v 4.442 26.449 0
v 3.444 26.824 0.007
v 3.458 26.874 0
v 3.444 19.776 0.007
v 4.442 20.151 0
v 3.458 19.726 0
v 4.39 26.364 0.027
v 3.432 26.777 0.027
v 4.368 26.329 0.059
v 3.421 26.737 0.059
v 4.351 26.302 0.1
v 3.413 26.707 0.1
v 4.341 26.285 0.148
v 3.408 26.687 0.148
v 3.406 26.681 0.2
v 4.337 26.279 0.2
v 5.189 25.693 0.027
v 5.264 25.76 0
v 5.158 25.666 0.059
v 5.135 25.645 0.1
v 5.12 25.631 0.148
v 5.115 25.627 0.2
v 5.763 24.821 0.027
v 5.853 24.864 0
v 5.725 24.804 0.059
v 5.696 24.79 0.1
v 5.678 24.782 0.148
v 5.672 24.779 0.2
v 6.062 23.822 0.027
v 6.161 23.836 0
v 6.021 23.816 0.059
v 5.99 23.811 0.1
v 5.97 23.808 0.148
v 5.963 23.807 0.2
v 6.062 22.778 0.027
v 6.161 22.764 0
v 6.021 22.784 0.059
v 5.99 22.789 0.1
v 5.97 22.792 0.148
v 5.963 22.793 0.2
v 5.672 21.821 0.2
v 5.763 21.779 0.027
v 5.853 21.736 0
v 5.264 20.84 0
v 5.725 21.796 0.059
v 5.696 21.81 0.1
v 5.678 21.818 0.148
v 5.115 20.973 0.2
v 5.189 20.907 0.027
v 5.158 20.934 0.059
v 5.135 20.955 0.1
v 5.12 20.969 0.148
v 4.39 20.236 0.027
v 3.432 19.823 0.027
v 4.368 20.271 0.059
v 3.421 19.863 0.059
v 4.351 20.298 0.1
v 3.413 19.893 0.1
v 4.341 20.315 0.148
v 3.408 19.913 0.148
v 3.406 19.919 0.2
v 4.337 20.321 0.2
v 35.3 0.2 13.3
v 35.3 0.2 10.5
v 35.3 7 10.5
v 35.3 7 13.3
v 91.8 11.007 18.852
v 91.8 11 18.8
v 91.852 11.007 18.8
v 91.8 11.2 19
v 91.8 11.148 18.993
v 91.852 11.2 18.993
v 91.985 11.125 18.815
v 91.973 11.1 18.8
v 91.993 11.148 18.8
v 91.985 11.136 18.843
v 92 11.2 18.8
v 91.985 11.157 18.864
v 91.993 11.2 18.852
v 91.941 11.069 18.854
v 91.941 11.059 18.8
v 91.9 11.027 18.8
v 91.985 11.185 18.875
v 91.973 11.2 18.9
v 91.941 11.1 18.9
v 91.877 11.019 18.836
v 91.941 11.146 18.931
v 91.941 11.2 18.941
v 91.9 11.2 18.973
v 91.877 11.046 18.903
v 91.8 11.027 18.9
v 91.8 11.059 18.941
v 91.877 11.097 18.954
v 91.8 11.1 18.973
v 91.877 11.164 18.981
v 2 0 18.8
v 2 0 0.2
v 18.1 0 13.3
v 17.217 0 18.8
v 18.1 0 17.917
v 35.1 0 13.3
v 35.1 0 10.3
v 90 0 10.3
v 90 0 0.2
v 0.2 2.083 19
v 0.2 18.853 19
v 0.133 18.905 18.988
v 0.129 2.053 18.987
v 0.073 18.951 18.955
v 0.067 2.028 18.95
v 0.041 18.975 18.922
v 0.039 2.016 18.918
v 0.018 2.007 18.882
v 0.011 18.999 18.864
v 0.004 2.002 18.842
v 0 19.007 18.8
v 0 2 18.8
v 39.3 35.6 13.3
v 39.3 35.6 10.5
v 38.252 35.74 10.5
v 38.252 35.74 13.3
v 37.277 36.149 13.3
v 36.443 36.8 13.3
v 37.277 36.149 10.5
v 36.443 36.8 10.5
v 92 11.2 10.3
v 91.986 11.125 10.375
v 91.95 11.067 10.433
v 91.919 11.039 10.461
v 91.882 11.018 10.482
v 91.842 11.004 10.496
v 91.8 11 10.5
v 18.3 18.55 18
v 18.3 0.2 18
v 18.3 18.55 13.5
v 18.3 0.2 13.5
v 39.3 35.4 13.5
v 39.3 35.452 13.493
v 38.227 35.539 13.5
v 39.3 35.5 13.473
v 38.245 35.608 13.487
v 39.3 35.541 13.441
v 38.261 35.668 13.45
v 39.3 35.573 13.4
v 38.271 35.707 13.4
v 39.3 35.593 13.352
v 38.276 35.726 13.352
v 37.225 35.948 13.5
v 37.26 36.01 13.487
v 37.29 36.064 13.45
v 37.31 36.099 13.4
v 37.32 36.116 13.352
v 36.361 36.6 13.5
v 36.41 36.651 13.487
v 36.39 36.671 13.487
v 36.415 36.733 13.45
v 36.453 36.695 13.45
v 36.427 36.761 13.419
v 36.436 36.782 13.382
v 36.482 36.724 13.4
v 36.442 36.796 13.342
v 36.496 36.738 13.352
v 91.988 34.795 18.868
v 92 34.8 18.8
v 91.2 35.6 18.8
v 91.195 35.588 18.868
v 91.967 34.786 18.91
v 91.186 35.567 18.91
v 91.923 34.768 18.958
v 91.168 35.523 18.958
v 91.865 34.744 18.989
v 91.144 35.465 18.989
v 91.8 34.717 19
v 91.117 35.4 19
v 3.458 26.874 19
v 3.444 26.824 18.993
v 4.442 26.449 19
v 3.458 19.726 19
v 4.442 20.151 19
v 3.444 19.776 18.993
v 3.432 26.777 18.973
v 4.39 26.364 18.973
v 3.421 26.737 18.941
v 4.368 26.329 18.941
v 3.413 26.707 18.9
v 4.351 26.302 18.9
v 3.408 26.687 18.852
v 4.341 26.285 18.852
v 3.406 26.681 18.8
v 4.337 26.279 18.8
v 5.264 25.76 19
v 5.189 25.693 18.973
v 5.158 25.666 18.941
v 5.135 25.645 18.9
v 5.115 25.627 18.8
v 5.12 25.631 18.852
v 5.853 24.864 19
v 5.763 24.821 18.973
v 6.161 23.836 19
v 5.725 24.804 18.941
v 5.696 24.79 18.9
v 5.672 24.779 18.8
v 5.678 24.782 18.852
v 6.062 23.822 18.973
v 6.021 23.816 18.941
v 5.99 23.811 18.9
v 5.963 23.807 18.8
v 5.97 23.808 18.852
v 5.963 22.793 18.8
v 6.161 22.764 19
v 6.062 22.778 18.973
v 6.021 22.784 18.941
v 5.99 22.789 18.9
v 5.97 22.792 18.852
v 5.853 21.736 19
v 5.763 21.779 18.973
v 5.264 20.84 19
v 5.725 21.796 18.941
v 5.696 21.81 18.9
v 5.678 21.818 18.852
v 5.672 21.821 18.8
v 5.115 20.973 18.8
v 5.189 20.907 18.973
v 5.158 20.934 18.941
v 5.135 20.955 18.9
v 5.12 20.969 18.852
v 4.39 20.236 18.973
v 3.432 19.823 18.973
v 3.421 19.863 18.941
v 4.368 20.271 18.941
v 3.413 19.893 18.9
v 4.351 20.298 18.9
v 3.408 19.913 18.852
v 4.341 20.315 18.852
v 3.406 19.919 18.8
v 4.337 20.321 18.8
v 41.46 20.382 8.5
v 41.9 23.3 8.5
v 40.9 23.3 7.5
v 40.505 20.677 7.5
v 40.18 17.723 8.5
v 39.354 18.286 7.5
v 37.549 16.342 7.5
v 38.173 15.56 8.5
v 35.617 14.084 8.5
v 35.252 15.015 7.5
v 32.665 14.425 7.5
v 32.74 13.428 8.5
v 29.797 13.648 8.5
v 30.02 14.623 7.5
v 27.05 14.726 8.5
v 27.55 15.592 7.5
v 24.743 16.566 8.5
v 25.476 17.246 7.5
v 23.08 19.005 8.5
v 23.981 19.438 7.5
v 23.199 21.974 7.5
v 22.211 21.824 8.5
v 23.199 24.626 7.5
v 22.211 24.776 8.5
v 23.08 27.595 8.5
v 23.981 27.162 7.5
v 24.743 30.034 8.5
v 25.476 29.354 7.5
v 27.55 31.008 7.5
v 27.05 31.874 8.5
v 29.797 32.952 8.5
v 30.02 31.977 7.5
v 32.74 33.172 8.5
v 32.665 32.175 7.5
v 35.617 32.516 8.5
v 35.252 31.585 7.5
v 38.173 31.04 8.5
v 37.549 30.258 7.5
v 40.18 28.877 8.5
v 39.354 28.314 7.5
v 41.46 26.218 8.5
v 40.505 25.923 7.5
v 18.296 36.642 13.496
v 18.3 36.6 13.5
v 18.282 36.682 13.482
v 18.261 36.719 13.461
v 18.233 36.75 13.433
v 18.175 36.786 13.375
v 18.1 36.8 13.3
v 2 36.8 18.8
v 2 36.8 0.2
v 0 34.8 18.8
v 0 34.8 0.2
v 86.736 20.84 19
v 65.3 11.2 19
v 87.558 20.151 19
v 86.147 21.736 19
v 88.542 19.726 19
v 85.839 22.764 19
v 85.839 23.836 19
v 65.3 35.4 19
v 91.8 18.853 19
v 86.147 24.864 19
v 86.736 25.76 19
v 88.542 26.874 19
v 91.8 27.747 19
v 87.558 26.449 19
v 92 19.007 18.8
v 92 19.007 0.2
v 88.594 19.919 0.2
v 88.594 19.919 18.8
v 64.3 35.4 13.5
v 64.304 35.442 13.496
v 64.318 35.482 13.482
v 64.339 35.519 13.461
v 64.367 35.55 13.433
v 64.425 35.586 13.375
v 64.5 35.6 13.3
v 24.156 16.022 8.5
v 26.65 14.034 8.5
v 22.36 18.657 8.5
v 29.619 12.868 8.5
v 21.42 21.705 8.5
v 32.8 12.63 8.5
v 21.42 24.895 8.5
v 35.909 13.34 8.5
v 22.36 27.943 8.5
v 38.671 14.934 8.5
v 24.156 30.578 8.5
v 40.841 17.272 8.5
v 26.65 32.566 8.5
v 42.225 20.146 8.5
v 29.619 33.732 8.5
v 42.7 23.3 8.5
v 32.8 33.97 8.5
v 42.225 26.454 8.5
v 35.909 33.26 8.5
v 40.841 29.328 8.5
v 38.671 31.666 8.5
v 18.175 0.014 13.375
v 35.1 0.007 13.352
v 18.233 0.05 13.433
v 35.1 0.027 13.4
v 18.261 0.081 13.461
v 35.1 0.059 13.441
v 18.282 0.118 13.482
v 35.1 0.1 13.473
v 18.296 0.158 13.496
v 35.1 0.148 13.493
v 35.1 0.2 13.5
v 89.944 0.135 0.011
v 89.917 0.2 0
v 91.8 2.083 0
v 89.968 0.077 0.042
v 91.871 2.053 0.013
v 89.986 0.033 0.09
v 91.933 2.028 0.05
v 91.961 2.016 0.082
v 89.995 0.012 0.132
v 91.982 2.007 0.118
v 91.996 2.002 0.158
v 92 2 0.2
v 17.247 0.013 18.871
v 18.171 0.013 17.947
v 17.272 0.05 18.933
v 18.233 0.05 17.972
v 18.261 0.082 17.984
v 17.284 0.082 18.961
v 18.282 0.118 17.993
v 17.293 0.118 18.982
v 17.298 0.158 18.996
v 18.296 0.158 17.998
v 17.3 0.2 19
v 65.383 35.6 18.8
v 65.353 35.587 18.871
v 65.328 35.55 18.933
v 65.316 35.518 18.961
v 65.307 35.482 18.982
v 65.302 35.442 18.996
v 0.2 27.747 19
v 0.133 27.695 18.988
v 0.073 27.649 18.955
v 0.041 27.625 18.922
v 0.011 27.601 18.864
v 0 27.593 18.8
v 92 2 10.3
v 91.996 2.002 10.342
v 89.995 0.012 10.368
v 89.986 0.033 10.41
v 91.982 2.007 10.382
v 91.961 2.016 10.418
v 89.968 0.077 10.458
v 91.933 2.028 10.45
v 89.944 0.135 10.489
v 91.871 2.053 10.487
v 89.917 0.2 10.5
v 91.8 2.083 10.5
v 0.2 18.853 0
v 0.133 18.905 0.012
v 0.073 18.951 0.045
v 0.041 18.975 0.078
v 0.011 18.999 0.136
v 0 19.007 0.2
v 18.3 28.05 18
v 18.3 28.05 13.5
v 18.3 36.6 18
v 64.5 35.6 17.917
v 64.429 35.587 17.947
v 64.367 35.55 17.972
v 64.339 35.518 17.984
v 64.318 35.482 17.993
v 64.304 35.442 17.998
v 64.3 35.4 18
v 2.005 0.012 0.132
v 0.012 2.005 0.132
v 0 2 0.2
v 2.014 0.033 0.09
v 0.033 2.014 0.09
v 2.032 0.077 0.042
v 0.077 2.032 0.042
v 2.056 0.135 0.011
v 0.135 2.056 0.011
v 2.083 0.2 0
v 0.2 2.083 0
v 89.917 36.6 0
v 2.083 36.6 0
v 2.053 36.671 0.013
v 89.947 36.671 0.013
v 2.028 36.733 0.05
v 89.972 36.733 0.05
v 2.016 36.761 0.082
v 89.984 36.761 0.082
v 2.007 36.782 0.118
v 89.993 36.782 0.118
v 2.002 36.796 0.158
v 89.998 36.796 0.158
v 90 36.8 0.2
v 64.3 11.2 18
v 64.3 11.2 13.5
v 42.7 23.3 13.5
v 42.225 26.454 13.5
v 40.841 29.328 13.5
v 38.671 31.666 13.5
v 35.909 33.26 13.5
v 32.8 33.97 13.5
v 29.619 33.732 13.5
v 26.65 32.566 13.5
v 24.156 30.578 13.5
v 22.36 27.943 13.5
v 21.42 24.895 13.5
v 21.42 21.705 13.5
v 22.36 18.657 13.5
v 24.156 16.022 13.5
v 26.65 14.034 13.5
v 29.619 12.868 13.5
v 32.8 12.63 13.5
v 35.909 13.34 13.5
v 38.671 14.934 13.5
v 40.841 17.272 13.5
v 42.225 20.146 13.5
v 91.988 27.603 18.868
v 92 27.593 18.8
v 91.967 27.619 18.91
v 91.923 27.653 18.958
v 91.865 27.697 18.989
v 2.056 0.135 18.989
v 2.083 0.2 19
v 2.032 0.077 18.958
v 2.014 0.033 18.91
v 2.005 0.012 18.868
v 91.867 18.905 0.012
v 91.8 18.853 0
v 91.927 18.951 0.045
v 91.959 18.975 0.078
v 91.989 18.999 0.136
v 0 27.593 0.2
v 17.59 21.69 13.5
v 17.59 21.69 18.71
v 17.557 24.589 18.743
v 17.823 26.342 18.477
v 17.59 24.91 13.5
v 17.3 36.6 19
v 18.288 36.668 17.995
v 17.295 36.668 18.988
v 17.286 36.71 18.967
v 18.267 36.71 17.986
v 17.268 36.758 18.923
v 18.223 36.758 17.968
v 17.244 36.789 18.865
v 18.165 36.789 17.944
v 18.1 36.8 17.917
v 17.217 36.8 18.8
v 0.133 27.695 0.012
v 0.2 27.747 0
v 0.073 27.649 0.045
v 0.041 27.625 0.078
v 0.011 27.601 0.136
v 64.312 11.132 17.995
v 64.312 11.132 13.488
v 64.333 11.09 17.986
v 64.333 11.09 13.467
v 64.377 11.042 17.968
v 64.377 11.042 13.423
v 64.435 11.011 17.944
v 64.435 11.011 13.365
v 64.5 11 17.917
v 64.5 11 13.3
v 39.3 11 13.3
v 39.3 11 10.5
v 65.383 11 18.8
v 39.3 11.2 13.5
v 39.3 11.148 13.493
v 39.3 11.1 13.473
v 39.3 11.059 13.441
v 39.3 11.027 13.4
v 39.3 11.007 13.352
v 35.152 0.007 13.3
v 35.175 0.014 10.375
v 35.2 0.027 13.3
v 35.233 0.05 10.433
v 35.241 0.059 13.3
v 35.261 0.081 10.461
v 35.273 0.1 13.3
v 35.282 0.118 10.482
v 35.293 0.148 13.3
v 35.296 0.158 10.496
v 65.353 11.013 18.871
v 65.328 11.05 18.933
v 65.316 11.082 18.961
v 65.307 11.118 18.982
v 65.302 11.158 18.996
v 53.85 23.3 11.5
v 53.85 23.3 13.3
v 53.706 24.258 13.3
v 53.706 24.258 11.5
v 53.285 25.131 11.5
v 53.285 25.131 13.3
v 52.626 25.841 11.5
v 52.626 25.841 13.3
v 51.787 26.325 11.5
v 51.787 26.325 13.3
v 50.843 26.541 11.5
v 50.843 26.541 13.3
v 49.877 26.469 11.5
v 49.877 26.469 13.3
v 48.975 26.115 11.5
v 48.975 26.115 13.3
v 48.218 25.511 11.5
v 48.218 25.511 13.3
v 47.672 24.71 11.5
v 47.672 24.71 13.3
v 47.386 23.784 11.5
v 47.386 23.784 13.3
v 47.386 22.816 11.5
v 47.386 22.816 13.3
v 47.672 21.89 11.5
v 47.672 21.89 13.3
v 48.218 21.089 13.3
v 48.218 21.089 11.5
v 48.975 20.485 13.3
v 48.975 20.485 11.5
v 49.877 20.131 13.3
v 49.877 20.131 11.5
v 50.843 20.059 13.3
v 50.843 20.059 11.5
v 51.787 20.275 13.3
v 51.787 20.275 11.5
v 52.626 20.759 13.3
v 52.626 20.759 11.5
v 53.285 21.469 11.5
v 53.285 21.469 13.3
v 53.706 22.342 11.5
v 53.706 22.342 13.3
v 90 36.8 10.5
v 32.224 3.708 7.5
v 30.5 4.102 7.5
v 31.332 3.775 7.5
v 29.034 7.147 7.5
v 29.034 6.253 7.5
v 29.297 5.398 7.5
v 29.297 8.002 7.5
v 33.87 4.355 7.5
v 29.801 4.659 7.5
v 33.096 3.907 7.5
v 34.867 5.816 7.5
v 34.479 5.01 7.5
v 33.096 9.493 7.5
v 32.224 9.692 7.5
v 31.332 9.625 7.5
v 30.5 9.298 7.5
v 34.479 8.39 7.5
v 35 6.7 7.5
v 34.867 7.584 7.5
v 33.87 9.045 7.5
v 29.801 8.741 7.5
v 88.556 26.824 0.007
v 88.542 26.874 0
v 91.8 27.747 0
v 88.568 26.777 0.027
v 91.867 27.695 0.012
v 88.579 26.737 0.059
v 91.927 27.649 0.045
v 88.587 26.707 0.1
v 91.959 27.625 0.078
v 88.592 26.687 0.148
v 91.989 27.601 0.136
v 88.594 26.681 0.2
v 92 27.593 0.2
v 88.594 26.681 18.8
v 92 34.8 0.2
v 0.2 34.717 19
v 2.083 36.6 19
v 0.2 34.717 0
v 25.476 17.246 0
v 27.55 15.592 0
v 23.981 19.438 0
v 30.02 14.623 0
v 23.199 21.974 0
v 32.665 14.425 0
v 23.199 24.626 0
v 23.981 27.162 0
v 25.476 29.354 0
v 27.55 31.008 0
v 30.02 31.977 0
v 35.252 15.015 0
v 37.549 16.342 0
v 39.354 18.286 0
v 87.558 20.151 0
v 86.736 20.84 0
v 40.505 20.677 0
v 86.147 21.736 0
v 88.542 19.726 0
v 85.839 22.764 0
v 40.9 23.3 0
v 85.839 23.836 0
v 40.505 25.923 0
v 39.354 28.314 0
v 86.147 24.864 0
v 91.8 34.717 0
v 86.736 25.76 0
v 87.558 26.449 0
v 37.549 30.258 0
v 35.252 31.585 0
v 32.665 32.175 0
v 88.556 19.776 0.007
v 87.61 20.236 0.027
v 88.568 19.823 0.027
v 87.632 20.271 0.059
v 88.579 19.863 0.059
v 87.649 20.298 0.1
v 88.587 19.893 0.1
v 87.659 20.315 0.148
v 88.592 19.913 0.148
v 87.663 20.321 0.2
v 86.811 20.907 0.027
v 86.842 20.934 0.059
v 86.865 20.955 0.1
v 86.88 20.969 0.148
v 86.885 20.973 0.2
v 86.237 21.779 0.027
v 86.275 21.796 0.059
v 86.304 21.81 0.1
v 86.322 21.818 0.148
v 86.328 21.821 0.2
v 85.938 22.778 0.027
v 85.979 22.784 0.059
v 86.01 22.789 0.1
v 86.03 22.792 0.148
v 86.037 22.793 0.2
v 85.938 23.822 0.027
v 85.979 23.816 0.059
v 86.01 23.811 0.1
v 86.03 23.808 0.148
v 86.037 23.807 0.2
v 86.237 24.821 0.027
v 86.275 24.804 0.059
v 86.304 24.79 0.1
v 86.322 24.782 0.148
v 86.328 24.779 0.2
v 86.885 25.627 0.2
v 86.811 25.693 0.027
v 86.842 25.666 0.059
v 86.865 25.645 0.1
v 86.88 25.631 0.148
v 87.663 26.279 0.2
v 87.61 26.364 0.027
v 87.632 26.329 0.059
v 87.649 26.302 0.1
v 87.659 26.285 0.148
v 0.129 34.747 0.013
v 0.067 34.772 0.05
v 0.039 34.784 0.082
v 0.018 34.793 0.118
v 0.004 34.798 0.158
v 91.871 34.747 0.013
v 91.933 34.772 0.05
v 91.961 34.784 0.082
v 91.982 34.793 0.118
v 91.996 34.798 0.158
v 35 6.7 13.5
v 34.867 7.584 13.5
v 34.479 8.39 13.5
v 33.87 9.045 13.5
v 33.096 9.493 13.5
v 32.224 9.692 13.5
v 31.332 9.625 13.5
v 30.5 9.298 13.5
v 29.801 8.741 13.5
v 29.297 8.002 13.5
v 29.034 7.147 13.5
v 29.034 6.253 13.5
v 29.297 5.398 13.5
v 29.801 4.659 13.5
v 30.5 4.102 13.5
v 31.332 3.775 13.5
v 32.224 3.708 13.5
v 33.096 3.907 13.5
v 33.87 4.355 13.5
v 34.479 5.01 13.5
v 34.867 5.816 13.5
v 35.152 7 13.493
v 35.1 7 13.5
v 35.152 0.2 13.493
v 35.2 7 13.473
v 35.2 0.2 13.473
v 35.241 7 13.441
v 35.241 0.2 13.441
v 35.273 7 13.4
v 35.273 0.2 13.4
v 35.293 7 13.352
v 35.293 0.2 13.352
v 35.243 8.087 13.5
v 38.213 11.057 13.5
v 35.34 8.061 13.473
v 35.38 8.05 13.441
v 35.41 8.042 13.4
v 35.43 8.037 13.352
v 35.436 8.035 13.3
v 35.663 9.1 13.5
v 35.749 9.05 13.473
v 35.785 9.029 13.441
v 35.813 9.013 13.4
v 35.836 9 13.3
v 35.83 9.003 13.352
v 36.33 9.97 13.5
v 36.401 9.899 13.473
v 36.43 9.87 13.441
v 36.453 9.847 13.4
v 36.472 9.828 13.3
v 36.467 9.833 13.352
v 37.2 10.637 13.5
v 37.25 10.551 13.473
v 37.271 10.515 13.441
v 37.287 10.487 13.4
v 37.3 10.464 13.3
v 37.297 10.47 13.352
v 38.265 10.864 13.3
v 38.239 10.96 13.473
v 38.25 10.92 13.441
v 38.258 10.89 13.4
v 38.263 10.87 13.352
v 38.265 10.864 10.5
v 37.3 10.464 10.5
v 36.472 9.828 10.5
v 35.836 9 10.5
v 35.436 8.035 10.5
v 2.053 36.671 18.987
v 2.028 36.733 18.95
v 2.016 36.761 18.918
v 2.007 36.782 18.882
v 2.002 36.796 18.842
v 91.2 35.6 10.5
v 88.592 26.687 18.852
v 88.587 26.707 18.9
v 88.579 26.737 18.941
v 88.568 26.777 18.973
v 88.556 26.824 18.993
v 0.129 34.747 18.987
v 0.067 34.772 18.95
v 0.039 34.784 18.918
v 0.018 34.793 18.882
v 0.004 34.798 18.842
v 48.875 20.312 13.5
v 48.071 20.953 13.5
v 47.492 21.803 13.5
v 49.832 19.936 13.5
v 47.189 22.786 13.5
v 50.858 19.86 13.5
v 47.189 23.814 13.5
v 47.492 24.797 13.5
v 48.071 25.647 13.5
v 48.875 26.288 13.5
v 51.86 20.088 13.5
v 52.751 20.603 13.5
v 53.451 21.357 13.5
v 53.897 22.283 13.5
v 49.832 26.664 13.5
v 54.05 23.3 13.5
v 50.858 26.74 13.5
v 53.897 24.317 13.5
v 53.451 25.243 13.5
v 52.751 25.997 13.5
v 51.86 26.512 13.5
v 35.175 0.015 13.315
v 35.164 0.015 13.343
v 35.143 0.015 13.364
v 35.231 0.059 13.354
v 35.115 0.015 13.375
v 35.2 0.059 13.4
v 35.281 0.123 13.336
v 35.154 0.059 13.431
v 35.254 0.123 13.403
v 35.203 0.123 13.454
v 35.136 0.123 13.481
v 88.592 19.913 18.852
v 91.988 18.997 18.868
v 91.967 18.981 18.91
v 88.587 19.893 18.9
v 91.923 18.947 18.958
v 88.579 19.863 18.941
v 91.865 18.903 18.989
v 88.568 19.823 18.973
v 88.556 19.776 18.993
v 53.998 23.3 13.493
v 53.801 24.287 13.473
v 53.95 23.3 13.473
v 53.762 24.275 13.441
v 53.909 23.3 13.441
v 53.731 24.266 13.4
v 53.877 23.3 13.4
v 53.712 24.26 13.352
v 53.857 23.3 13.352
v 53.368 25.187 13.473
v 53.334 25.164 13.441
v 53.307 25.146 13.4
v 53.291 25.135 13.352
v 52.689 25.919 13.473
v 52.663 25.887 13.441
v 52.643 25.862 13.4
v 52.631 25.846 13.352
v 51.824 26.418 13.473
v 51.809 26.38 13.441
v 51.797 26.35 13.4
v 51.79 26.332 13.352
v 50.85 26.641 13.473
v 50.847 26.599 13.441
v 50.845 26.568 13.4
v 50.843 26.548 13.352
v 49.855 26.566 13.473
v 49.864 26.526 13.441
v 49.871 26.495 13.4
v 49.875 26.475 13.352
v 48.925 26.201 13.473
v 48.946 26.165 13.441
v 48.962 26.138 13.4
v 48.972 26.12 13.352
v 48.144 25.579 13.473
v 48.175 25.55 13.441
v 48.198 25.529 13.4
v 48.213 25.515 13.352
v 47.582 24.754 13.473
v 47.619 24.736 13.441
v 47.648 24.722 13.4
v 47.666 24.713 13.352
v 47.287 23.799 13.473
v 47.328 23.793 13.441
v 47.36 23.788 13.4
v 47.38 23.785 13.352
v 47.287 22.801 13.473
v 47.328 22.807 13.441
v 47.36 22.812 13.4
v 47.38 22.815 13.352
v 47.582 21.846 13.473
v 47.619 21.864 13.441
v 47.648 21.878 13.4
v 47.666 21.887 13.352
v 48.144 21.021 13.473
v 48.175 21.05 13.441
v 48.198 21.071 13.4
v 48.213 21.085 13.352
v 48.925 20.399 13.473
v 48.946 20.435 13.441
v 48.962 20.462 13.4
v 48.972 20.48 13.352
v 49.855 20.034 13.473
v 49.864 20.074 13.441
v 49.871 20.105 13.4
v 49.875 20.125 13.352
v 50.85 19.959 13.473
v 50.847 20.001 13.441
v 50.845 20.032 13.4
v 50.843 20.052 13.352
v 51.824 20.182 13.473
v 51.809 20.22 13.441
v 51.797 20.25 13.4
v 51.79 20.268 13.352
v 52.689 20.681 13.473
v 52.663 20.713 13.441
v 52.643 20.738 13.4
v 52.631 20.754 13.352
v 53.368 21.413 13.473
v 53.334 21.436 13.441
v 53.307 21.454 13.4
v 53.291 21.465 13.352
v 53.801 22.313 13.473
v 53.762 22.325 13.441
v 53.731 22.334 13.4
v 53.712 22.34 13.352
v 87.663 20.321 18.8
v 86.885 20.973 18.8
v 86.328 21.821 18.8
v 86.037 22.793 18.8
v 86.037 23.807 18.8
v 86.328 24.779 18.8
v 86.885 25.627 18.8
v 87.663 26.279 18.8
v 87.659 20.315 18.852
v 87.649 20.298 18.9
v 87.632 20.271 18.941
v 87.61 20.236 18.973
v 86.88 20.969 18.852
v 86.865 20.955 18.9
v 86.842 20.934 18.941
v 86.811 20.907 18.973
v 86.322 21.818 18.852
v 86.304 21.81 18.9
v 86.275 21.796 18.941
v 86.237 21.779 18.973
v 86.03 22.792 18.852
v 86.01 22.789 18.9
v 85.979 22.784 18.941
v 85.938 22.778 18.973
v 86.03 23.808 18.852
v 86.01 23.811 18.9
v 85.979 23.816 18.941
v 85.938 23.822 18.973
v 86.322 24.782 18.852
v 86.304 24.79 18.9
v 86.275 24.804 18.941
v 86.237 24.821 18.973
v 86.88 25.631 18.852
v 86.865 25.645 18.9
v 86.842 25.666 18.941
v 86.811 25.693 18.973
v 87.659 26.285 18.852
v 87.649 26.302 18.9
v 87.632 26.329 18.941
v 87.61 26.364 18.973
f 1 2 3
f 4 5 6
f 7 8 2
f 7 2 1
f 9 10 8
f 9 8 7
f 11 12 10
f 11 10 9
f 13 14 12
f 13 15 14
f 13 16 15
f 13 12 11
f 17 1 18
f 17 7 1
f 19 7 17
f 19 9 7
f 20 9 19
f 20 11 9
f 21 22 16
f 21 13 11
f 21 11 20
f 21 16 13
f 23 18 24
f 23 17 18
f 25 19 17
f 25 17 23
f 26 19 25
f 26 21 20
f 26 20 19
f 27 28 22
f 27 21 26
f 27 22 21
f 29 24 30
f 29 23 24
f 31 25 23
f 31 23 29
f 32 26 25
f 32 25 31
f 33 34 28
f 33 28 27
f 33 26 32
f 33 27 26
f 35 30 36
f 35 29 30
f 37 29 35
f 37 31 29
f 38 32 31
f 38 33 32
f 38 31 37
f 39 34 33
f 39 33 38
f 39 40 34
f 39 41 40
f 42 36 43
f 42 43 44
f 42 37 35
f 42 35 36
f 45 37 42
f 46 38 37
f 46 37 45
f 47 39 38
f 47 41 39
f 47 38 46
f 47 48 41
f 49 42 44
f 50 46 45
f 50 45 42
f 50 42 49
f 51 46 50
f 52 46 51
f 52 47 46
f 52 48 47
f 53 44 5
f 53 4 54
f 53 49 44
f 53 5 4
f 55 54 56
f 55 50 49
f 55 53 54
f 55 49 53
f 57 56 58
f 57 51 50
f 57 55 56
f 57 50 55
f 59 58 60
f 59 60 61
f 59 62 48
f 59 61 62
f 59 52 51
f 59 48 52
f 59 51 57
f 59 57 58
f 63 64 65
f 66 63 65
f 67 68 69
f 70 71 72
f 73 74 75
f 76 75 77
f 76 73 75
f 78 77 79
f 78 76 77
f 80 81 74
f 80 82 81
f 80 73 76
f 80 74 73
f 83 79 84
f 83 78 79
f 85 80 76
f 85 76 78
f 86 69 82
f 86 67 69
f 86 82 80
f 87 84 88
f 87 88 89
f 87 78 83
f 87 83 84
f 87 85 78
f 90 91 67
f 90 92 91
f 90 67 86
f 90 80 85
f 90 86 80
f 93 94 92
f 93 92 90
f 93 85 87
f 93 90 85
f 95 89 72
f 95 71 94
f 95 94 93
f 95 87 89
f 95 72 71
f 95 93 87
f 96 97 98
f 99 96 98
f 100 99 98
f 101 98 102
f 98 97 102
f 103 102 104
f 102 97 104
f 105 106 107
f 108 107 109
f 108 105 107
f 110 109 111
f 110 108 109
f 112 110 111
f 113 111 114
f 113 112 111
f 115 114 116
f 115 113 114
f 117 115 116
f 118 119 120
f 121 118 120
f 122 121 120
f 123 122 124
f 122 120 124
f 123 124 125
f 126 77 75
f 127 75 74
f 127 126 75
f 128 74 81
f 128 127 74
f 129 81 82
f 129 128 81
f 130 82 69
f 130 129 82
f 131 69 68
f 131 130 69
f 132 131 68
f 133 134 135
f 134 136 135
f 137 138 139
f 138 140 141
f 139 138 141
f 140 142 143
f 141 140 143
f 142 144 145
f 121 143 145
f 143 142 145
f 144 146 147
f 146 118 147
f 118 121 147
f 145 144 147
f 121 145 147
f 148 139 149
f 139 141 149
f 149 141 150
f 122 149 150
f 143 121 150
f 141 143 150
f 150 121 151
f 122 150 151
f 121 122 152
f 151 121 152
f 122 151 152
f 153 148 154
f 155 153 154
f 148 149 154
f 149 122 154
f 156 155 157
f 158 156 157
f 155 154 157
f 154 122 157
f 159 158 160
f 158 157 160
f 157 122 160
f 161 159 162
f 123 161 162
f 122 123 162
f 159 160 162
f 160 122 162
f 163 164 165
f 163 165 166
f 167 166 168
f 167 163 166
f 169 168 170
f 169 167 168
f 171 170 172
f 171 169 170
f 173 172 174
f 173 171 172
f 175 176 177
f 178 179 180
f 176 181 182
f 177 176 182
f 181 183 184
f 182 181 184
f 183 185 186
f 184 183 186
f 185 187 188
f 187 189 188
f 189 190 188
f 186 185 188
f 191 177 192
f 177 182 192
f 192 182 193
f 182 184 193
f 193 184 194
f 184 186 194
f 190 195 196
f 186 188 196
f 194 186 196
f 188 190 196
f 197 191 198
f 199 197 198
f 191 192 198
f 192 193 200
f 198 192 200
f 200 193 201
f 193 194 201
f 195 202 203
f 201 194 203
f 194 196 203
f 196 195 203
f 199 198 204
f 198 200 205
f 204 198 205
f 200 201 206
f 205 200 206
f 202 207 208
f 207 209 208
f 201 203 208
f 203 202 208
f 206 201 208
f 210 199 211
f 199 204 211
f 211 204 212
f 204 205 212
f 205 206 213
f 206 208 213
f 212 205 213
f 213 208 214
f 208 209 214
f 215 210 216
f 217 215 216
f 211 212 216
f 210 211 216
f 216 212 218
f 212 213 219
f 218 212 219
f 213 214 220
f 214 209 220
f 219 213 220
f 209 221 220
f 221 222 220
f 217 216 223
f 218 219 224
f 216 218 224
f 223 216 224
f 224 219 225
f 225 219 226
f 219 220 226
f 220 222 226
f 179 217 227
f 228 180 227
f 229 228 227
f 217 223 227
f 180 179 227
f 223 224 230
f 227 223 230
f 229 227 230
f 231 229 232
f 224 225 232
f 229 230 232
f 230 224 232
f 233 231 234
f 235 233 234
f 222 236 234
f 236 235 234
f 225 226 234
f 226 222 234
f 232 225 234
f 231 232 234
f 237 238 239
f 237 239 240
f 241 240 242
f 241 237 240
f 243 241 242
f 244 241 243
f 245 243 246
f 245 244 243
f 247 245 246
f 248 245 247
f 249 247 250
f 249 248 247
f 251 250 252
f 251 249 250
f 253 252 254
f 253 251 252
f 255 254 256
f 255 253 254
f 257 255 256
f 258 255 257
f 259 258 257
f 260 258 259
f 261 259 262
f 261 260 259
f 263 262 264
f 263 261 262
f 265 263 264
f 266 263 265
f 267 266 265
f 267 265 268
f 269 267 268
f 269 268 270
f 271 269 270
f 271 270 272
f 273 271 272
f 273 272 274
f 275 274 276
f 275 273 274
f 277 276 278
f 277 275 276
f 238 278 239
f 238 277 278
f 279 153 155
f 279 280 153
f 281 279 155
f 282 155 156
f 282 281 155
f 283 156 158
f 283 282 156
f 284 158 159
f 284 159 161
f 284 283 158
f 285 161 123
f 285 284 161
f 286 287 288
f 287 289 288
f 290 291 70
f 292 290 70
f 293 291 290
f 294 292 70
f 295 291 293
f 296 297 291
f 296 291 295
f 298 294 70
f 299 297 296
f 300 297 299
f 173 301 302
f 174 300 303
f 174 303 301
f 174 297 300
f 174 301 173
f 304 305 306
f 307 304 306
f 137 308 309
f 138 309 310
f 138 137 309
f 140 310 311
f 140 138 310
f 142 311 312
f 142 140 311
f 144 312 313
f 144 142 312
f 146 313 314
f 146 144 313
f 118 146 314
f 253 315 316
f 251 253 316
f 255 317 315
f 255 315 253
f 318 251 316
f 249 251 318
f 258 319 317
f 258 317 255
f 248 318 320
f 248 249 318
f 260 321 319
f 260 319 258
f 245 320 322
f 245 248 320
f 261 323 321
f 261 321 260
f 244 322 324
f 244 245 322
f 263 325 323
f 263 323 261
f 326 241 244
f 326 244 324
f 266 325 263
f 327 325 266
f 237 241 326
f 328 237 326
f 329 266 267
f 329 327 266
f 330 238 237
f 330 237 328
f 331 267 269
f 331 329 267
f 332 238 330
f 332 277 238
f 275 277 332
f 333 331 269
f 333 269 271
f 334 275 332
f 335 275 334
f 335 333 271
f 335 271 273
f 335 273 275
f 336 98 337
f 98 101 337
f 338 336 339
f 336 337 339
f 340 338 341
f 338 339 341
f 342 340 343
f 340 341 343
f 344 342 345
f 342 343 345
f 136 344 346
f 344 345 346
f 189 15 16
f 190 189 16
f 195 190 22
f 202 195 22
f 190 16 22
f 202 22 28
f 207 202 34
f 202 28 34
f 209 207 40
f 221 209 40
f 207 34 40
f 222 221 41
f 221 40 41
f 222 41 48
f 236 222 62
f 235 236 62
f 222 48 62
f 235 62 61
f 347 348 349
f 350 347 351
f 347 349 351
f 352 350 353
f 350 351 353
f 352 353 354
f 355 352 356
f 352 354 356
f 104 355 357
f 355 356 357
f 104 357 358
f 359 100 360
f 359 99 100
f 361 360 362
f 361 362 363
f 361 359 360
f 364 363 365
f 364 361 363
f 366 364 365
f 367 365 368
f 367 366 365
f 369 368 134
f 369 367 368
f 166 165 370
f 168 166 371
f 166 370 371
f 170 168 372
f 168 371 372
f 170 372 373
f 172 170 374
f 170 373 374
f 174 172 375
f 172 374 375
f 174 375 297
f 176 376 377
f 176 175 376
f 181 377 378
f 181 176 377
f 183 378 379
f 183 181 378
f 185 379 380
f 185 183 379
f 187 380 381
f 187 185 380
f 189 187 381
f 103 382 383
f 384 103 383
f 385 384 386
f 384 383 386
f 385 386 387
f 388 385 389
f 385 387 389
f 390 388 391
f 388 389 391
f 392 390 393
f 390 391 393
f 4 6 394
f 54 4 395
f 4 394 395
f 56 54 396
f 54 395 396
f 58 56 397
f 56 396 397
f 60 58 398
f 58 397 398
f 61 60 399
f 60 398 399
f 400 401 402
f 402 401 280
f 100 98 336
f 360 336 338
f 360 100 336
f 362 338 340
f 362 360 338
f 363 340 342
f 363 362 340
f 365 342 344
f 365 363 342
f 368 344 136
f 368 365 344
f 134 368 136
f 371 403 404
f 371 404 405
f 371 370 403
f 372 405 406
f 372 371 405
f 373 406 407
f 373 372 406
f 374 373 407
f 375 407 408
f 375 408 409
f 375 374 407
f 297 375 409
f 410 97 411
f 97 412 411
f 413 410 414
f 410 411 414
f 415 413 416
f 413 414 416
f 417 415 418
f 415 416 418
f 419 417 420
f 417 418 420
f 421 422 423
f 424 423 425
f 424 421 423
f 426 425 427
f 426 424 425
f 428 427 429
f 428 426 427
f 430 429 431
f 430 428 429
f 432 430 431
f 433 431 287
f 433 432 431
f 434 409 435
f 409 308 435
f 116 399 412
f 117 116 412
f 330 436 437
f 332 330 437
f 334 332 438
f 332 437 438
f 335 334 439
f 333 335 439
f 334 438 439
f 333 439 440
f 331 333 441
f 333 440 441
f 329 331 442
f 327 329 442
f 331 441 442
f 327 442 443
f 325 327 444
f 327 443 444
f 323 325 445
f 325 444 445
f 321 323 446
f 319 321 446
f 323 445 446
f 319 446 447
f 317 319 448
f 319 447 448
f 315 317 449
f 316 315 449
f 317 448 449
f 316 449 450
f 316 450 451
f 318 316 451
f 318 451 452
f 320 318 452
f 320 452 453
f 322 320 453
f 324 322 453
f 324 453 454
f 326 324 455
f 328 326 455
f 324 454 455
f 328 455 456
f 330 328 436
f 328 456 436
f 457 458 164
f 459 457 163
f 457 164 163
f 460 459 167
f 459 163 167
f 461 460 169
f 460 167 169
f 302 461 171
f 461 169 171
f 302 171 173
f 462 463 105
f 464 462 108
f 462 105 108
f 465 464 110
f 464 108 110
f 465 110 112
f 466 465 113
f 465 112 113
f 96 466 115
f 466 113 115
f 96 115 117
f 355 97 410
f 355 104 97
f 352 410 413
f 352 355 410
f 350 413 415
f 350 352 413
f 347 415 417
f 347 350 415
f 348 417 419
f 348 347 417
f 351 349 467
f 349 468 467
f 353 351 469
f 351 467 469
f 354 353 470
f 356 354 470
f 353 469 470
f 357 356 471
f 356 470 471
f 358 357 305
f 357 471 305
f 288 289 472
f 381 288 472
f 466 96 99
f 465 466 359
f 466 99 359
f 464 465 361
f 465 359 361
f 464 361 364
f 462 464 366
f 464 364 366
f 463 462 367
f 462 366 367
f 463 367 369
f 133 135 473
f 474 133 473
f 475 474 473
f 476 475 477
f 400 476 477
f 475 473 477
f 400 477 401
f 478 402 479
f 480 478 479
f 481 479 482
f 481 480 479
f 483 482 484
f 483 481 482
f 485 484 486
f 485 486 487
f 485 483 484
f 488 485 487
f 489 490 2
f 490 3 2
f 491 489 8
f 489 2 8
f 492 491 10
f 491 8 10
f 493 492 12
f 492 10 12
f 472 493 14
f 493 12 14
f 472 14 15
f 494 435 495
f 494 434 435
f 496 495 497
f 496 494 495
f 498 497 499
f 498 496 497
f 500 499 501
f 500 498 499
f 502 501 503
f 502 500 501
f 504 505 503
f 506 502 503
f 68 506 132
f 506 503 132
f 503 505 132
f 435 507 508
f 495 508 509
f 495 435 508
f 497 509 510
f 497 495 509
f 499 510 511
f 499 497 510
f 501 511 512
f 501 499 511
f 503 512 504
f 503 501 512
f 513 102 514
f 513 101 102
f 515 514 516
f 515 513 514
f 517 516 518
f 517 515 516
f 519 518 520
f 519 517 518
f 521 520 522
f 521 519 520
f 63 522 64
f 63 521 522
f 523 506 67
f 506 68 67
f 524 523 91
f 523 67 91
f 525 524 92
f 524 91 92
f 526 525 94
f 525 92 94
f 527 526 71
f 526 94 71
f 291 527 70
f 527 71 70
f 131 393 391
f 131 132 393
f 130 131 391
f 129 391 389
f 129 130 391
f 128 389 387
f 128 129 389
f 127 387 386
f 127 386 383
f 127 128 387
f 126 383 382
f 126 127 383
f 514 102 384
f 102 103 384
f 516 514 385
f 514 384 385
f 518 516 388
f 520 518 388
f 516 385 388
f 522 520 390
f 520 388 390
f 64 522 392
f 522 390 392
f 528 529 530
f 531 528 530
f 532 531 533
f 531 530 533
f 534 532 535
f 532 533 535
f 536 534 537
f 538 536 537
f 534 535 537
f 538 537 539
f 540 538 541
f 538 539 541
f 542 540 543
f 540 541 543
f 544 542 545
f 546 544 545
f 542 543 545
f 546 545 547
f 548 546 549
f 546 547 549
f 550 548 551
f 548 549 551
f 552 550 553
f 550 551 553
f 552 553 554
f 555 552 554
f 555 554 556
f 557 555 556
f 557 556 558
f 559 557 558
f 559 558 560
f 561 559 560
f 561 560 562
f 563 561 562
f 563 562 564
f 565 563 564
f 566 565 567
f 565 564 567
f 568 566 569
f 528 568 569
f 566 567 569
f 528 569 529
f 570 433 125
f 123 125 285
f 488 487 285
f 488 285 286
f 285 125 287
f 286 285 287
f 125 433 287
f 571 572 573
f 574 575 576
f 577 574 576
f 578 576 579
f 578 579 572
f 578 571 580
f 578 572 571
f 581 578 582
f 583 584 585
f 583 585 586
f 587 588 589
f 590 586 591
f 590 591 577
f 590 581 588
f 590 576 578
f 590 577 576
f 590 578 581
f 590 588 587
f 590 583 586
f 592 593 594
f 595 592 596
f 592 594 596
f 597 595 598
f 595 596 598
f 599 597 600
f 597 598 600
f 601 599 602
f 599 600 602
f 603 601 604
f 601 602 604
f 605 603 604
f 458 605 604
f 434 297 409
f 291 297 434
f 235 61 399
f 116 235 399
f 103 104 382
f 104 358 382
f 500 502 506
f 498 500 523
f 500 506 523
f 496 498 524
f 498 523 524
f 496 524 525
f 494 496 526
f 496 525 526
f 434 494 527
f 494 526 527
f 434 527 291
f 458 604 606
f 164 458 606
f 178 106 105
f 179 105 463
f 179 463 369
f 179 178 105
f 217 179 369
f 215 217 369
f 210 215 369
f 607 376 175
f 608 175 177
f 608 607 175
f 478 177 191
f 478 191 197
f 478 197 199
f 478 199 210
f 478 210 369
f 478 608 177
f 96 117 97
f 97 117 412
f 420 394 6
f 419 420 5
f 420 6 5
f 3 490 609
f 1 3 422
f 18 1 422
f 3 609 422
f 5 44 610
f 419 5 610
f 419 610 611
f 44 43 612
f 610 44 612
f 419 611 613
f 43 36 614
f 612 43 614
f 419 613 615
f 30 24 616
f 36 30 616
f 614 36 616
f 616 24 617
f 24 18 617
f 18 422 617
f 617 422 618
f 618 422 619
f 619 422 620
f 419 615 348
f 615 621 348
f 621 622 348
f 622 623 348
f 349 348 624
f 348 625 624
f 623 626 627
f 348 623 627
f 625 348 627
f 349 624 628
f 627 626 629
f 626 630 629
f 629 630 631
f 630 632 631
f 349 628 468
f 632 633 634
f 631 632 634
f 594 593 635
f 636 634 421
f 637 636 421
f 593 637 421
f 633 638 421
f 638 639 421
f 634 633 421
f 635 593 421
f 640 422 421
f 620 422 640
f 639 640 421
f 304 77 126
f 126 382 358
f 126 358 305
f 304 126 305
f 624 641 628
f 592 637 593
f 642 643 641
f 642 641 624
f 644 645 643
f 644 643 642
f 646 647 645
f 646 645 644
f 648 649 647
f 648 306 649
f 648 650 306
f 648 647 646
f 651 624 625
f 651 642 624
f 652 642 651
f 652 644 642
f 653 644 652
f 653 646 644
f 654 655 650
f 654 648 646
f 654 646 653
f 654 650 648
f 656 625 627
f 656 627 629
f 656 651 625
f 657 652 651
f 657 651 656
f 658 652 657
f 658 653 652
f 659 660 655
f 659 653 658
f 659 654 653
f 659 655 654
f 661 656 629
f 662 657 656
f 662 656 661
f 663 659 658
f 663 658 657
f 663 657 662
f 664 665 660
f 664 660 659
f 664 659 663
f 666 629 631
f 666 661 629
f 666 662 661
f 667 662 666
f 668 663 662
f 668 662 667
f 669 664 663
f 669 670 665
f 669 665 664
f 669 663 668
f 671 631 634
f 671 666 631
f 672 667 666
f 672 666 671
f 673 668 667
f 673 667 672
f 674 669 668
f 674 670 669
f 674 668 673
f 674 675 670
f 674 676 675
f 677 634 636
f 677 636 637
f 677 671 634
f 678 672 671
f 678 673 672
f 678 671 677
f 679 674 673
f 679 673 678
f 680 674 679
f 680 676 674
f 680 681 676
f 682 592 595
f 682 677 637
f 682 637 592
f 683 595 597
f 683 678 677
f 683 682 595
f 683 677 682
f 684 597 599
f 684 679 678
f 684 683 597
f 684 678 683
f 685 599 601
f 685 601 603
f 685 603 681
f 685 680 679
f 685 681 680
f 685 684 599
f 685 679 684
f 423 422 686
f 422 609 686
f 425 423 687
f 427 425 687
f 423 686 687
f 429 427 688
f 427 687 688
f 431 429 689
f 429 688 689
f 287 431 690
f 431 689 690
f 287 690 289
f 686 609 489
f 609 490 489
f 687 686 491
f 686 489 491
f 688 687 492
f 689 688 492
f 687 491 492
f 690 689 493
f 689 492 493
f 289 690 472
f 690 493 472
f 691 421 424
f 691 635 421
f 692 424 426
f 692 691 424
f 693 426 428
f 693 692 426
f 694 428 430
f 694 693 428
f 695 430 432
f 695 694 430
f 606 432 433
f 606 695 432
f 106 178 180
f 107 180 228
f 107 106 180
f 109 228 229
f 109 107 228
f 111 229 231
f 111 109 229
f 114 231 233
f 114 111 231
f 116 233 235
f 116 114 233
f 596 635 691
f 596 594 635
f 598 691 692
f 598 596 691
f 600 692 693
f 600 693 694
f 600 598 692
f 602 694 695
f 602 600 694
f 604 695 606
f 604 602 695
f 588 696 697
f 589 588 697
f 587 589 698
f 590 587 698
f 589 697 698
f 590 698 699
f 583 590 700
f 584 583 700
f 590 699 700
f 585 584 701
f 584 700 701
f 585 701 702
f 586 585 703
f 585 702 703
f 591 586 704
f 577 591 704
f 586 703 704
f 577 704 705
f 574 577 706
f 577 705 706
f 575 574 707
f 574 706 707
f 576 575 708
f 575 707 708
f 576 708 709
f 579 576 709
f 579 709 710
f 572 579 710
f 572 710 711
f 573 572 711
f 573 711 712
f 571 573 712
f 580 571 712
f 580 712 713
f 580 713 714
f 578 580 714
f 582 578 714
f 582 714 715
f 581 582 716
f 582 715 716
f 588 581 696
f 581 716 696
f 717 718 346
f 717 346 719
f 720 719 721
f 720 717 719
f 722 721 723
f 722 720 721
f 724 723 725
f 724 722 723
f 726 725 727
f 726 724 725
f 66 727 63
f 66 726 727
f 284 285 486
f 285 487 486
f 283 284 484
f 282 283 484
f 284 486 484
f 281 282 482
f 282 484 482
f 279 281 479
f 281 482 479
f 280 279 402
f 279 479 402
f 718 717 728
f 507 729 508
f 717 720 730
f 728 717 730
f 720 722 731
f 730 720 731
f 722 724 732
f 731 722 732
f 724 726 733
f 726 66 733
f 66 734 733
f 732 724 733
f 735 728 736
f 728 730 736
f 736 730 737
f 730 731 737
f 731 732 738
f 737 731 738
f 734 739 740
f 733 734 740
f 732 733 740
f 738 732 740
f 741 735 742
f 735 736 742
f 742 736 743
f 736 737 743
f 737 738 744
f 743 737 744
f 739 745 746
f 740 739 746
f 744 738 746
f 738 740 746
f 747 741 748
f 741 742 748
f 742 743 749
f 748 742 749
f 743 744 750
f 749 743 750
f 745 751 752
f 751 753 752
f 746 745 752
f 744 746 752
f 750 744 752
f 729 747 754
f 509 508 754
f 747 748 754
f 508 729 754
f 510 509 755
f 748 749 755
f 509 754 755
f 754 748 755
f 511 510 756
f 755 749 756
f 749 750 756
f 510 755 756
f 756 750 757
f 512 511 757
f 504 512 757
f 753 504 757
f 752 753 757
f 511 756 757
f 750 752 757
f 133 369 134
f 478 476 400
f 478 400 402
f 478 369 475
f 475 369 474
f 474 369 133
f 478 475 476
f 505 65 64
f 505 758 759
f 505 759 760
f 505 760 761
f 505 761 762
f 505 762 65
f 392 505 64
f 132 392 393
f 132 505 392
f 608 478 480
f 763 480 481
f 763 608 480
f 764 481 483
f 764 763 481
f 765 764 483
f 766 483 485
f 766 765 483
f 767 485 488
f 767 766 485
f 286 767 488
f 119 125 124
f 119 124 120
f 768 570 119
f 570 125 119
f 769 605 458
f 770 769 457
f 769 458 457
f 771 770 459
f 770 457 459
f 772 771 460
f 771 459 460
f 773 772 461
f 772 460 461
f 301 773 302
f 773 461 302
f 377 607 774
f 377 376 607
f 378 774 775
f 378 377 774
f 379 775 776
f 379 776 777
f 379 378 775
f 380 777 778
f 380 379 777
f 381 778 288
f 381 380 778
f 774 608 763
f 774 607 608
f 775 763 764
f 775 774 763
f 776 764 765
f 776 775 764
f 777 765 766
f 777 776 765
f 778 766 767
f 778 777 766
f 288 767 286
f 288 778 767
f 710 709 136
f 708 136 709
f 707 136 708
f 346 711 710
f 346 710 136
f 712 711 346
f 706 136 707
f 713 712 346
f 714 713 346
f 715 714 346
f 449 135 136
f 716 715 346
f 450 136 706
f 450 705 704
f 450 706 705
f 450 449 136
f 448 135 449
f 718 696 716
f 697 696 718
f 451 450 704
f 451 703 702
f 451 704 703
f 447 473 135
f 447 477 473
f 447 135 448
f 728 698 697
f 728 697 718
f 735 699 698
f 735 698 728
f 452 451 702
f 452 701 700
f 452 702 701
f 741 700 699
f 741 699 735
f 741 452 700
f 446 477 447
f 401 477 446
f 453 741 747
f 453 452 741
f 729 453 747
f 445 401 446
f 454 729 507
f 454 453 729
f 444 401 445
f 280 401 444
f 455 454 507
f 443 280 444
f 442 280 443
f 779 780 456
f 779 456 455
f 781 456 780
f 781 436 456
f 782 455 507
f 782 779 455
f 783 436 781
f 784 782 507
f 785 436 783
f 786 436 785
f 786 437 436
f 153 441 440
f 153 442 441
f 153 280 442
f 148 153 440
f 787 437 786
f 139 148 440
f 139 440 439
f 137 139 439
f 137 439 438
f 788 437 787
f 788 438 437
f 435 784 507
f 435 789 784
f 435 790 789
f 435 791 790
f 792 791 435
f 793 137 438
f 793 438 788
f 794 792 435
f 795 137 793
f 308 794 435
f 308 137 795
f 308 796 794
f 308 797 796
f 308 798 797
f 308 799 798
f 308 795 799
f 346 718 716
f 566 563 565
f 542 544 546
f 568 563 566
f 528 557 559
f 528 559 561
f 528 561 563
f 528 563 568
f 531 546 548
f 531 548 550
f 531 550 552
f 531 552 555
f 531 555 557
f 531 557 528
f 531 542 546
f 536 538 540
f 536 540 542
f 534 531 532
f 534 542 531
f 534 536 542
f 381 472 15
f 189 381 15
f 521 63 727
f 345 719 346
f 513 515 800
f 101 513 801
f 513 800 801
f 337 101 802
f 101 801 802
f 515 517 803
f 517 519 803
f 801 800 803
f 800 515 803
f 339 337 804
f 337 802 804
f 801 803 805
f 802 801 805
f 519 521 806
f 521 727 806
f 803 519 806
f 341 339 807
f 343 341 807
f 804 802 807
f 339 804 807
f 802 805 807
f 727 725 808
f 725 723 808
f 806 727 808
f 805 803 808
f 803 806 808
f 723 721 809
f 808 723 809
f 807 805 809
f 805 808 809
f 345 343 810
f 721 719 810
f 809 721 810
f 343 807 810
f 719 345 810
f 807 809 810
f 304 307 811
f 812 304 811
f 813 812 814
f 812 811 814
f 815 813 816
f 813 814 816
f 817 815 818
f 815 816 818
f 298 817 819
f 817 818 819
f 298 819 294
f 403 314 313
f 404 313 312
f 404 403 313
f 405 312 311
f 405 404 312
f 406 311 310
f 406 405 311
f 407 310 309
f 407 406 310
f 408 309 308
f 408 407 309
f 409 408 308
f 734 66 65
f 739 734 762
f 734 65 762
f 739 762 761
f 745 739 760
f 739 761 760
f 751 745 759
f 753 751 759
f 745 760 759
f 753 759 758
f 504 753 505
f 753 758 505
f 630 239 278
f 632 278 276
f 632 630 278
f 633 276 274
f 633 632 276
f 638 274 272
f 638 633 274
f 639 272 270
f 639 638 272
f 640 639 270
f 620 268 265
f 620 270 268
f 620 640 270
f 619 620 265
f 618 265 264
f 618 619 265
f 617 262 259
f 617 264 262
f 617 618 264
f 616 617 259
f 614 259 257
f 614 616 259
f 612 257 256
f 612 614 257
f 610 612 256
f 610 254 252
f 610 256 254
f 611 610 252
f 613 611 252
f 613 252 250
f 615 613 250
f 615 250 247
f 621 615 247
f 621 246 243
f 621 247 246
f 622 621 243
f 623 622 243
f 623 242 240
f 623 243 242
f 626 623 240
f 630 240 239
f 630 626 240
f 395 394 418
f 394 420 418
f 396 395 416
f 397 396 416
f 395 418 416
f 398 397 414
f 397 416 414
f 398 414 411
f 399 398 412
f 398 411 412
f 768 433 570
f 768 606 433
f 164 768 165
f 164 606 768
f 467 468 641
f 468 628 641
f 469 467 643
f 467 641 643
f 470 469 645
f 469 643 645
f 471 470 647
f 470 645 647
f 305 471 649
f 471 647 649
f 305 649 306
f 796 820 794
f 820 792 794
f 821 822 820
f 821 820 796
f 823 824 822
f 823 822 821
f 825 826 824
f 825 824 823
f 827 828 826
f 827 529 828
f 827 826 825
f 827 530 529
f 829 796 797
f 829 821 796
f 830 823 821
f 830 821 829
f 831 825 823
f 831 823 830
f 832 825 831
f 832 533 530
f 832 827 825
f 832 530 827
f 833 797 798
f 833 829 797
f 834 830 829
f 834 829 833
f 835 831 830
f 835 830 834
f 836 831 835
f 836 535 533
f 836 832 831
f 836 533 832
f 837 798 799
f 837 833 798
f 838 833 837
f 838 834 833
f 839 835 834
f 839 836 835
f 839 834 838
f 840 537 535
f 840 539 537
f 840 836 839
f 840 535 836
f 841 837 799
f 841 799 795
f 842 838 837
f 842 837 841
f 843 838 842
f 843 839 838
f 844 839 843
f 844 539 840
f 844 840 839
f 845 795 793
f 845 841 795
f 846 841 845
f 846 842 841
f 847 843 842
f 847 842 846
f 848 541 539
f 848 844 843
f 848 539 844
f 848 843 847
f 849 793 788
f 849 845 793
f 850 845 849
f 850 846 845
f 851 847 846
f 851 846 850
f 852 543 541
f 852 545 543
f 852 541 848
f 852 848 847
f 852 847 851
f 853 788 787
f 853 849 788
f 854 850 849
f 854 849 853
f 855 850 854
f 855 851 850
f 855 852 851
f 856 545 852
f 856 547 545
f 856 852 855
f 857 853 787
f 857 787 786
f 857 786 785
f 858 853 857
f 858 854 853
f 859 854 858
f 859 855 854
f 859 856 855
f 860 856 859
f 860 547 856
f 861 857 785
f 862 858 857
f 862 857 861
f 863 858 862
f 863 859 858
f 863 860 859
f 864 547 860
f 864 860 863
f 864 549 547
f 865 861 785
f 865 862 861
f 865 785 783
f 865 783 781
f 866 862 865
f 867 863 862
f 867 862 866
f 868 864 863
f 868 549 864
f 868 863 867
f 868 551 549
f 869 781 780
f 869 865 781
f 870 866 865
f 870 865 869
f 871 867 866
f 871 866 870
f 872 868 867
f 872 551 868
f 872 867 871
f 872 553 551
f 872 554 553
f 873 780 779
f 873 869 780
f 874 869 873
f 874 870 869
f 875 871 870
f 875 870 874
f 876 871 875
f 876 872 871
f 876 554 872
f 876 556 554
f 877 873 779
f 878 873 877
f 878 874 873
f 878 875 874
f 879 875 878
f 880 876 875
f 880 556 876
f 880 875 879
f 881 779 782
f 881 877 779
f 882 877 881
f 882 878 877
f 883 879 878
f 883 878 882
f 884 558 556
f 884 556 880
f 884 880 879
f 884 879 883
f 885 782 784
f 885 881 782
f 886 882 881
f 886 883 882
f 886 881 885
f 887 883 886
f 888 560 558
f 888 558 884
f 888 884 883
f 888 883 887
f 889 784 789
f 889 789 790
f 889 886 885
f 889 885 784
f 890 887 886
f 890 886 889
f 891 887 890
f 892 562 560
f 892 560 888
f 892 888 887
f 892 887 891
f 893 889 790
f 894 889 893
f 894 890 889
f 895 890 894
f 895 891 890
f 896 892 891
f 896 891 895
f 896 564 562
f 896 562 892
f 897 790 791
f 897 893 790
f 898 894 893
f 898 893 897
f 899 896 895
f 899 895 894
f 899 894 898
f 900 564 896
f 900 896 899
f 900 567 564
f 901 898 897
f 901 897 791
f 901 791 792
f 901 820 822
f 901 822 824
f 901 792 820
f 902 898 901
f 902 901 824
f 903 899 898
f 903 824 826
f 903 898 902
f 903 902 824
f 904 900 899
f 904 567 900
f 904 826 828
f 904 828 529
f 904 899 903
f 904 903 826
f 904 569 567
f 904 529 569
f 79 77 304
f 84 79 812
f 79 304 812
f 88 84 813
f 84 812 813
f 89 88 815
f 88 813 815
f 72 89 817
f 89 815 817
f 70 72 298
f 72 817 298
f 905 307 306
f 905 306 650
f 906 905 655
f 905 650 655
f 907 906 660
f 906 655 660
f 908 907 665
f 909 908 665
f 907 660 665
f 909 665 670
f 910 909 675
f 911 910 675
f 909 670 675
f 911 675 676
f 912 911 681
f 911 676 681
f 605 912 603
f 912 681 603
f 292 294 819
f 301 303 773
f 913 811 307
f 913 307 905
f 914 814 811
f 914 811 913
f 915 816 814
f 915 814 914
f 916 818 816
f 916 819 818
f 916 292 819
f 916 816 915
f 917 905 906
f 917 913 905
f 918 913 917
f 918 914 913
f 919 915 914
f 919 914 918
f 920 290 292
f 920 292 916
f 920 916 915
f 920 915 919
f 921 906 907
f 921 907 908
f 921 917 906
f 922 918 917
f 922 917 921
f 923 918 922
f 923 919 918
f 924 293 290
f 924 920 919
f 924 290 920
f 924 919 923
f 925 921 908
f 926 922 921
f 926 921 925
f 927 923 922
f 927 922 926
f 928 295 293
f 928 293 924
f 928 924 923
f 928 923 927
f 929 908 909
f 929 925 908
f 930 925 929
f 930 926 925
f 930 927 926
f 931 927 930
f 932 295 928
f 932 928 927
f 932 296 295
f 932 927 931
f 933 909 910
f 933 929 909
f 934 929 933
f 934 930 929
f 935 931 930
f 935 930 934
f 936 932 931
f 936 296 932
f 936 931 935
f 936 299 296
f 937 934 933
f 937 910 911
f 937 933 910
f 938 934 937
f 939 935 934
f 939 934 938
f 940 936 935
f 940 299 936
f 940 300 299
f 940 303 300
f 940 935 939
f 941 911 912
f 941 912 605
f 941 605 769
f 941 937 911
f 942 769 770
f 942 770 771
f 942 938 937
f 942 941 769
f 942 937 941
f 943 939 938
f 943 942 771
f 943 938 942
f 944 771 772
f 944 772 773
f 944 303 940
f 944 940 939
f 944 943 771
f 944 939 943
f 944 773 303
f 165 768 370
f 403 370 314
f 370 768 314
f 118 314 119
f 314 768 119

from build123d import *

# Parameters (mm, degrees)
F0_R     = 8.9
F3_DEPTH = 13.5
F0_W     = 27.7
F0_H     = 11
F0_H_2   = 1.2
F4_DEPTH = 10.5
F2_R     = 10.7
F5_DEPTH = 5
F2_R_2   = 3.25
F6_DEPTH = 2
F2_R_3   = 3
F7_DEPTH = 6
F8_DEPTH = 5.5
F9_SIZE  = 1
F10_SIZE = 2
F11_R    = 0.2


with BuildPart() as f3:
    # F0 (on Top) → F3 (new body)
    with BuildSketch(Plane.XY):
        with BuildLine():
            Line((0, 19.0066603875), (0, 0))
            Line((0, 0), (18.3, 0))
            Line((18.3, 0), (18.3, 18.5502631652))
            ThreePointArc((18.3, 18.5502631652), (17.5, 23.3), (18.3, 28.0497368348))
            Line((18.3, 28.0497368348), (18.3, 36.8))
            Line((18.3, 36.8), (0, 36.8))
            Line((0, 36.8), (0, 27.5933396125))
            Line((0, 27.5933396125), (3.4058666579, 26.680740392))
            ThreePointArc((3.4058666579, 26.680740392), (6, 23.3), (3.4058666579, 19.919259608))
            Line((3.4058666579, 19.919259608), (0, 19.0066603875))
        make_face()
        with BuildLine():
            Line((18.3, 18.5502631652), (18.3, 0))
            Line((18.3, 0), (35.3, 0))
            Line((35.3, 0), (35.3, 7))
            ThreePointArc((35.3, 7), (36.4715728753, 9.8284271247), (39.3, 11))
            Line((39.3, 11), (64.3, 11))
            Line((64.3, 11), (64.3, 35.6))
            Line((64.3, 35.6), (39.3, 35.6))
            ThreePointArc((39.3, 35.6), (37.7508066615, 35.9121822171), (36.4434286286, 36.8))
            Line((36.4434286286, 36.8), (18.3, 36.8))
            Line((18.3, 36.8), (18.3, 28.0497368348))
            ThreePointArc((18.3, 28.0497368348), (17.5, 23.3), (18.3, 18.5502631652))
        make_face()
        with Locations((32, 23.3)):
            Circle(F0_R, mode=Mode.SUBTRACT)
        with BuildLine():
            Line((64.3, 35.6), (64.3, 11))
            Line((64.3, 11), (92, 11))
            Line((92, 11), (92, 19.0066603875))
            Line((92, 19.0066603875), (88.5941333421, 19.919259608))
            ThreePointArc((88.5941333421, 19.919259608), (86, 23.3), (88.5941333421, 26.680740392))
            Line((88.5941333421, 26.680740392), (92, 27.5933396125))
            Line((92, 27.5933396125), (92, 35.6))
            Line((92, 35.6), (64.3, 35.6))
        make_face()
    extrude(amount=F3_DEPTH)

    # F0 (on Top) → F4 (join)
    with BuildSketch(Plane.XY):
        with BuildLine():
            Line((35.3, 7), (35.3, 0))
            Line((35.3, 0), (64.3, 0))
            Line((64.3, 0), (64.3, 11))
            Line((64.3, 11), (39.3, 11))
            ThreePointArc((39.3, 11), (36.4715728753, 9.8284271247), (35.3, 7))
        make_face()
        with Locations((78.15, 5.5)):
            Rectangle(F0_W, F0_H)
        with Locations((78.15, 36.2)):
            Rectangle(F0_W, F0_H_2)
        with BuildLine():
            Line((39.3, 35.6), (64.3, 35.6))
            Line((64.3, 35.6), (64.3, 36.8))
            Line((64.3, 36.8), (36.4434286286, 36.8))
            ThreePointArc((36.4434286286, 36.8), (37.7508066615, 35.9121822171), (39.3, 35.6))
        make_face()
    extrude(amount=F4_DEPTH)

    # F2 (on offset) → F5 (cut)
    with BuildSketch(Plane.XY.offset(13.5)):
        with Locations((32, 23.3)):
            Circle(F2_R)
    extrude(amount=-F5_DEPTH, mode=Mode.SUBTRACT)

    # F2 (on offset) → F6 (cut)
    with BuildSketch(Plane.XY.offset(13.5)):
        with Locations((50.6, 23.3)):
            Circle(F2_R_2)
    extrude(amount=-F6_DEPTH, mode=Mode.SUBTRACT)

    # F2 (on offset) → F7 (cut)
    with BuildSketch(Plane.XY.offset(13.5)):
        with Locations((32, 6.7)):
            Circle(F2_R_3)
    extrude(amount=-F7_DEPTH, mode=Mode.SUBTRACT)

    # F2 (on offset) → F8 (join)
    with BuildSketch(Plane.XY.offset(13.5)):
        with BuildLine():
            Line((0, 0), (18.3, 0))
            Line((18.3, 0), (18.3, 18.5502631652))
            ThreePointArc((18.3, 18.5502631652), (17.5, 23.3), (18.3, 28.0497368348))
            Line((18.3, 28.0497368348), (18.3, 36.8))
            Line((18.3, 36.8), (0, 36.8))
            Line((0, 36.8), (0, 27.5933396125))
            Line((0, 27.5933396125), (3.4058666579, 26.680740392))
            ThreePointArc((3.4058666579, 26.680740392), (6, 23.3), (3.4058666579, 19.919259608))
            Line((3.4058666579, 19.919259608), (0, 19.0066603875))
            Line((0, 19.0066603875), (0, 0))
        make_face()
        with BuildLine():
            Line((64.3, 35.6), (64.3, 11))
            Line((64.3, 11), (92, 11))
            Line((92, 11), (92, 19.0066603875))
            Line((92, 19.0066603875), (88.5941333421, 19.919259608))
            ThreePointArc((88.5941333421, 19.919259608), (86, 23.3), (88.5941333421, 26.680740392))
            Line((88.5941333421, 26.680740392), (92, 27.5933396125))
            Line((92, 27.5933396125), (92, 35.6))
            Line((92, 35.6), (64.3, 35.6))
        make_face()
    extrude(amount=F8_DEPTH)

    # F9
    f9_edges = [f3.edges().sort_by_distance(p)[0] for p in [
        (18.3, 9.275132, 19),
        (23.1, 23.3, 8.5),
        (64.3, 23.3, 19),
    ]]
    chamfer(f9_edges, length=F9_SIZE)

    # F10
    f10_edges = [f3.edges().sort_by_distance(p)[0] for p in [
        (92, 0, 5.25),
        (0, 0, 9.5),
        (92, 36.8, 5.25),
        (0, 36.8, 9.5),
    ]]
    chamfer(f10_edges, length=F10_SIZE)

    # F11
    f11_edges = [f3.edges().sort_by_distance(p)[0] for p in [
        (47.35, 23.3, 13.5),
        (35.3, 3.5, 13.5),
        (64.3, 11, 15.75),
        (64.8, 11, 18.5),
        (78.65, 11, 19),
        (92, 11, 14.75),
        (92, 6.5, 10.5),
        (91, 1, 10.5),
        (62.65, 0, 10.5),
        (35.3, 0, 12),
        (26.8, 0, 13.5),
        (18.3, 0, 15.75),
        (17.8, 0, 18.5),
        (9.65, 0, 19),
        (1, 1, 19),
        (0, 10.50333, 19),
        (1.702933, 19.46296, 19),
        (6, 23.3, 19),
        (0, 31.19667, 19),
        (1, 35.8, 19),
        (9.65, 36.8, 19),
        (17.8, 36.8, 18.5),
        (18.3, 36.8, 15.75),
        (27.371714, 36.8, 13.5),
        (92, 15.00333, 19),
        (90.297067, 19.46296, 19),
        (86, 23.3, 19),
        (90.297067, 27.13704, 19),
        (92, 31.19667, 19),
        (91.6, 35.2, 19),
        (78.25, 35.6, 19),
        (64.8, 35.6, 18.5),
        (64.3, 35.6, 15.75),
        (51.8, 35.6, 13.5),
        (37.750807, 35.912182, 13.5),
        (1, 1, 0),
        (46, 0, 0),
        (91, 1, 0),
        (92, 10.50333, 0),
        (90.297067, 19.46296, 0),
        (86, 23.3, 0),
        (92, 31.19667, 0),
        (91, 35.8, 0),
        (0, 10.50333, 0),
        (1.702933, 19.46296, 0),
        (6, 23.3, 0),
        (1.702933, 27.13704, 0),
        (0, 31.19667, 0),
        (1, 35.8, 0),
        (46, 36.8, 0),
    ]]
    fillet(f11_edges, radius=F11_R)


solid = f3.part
